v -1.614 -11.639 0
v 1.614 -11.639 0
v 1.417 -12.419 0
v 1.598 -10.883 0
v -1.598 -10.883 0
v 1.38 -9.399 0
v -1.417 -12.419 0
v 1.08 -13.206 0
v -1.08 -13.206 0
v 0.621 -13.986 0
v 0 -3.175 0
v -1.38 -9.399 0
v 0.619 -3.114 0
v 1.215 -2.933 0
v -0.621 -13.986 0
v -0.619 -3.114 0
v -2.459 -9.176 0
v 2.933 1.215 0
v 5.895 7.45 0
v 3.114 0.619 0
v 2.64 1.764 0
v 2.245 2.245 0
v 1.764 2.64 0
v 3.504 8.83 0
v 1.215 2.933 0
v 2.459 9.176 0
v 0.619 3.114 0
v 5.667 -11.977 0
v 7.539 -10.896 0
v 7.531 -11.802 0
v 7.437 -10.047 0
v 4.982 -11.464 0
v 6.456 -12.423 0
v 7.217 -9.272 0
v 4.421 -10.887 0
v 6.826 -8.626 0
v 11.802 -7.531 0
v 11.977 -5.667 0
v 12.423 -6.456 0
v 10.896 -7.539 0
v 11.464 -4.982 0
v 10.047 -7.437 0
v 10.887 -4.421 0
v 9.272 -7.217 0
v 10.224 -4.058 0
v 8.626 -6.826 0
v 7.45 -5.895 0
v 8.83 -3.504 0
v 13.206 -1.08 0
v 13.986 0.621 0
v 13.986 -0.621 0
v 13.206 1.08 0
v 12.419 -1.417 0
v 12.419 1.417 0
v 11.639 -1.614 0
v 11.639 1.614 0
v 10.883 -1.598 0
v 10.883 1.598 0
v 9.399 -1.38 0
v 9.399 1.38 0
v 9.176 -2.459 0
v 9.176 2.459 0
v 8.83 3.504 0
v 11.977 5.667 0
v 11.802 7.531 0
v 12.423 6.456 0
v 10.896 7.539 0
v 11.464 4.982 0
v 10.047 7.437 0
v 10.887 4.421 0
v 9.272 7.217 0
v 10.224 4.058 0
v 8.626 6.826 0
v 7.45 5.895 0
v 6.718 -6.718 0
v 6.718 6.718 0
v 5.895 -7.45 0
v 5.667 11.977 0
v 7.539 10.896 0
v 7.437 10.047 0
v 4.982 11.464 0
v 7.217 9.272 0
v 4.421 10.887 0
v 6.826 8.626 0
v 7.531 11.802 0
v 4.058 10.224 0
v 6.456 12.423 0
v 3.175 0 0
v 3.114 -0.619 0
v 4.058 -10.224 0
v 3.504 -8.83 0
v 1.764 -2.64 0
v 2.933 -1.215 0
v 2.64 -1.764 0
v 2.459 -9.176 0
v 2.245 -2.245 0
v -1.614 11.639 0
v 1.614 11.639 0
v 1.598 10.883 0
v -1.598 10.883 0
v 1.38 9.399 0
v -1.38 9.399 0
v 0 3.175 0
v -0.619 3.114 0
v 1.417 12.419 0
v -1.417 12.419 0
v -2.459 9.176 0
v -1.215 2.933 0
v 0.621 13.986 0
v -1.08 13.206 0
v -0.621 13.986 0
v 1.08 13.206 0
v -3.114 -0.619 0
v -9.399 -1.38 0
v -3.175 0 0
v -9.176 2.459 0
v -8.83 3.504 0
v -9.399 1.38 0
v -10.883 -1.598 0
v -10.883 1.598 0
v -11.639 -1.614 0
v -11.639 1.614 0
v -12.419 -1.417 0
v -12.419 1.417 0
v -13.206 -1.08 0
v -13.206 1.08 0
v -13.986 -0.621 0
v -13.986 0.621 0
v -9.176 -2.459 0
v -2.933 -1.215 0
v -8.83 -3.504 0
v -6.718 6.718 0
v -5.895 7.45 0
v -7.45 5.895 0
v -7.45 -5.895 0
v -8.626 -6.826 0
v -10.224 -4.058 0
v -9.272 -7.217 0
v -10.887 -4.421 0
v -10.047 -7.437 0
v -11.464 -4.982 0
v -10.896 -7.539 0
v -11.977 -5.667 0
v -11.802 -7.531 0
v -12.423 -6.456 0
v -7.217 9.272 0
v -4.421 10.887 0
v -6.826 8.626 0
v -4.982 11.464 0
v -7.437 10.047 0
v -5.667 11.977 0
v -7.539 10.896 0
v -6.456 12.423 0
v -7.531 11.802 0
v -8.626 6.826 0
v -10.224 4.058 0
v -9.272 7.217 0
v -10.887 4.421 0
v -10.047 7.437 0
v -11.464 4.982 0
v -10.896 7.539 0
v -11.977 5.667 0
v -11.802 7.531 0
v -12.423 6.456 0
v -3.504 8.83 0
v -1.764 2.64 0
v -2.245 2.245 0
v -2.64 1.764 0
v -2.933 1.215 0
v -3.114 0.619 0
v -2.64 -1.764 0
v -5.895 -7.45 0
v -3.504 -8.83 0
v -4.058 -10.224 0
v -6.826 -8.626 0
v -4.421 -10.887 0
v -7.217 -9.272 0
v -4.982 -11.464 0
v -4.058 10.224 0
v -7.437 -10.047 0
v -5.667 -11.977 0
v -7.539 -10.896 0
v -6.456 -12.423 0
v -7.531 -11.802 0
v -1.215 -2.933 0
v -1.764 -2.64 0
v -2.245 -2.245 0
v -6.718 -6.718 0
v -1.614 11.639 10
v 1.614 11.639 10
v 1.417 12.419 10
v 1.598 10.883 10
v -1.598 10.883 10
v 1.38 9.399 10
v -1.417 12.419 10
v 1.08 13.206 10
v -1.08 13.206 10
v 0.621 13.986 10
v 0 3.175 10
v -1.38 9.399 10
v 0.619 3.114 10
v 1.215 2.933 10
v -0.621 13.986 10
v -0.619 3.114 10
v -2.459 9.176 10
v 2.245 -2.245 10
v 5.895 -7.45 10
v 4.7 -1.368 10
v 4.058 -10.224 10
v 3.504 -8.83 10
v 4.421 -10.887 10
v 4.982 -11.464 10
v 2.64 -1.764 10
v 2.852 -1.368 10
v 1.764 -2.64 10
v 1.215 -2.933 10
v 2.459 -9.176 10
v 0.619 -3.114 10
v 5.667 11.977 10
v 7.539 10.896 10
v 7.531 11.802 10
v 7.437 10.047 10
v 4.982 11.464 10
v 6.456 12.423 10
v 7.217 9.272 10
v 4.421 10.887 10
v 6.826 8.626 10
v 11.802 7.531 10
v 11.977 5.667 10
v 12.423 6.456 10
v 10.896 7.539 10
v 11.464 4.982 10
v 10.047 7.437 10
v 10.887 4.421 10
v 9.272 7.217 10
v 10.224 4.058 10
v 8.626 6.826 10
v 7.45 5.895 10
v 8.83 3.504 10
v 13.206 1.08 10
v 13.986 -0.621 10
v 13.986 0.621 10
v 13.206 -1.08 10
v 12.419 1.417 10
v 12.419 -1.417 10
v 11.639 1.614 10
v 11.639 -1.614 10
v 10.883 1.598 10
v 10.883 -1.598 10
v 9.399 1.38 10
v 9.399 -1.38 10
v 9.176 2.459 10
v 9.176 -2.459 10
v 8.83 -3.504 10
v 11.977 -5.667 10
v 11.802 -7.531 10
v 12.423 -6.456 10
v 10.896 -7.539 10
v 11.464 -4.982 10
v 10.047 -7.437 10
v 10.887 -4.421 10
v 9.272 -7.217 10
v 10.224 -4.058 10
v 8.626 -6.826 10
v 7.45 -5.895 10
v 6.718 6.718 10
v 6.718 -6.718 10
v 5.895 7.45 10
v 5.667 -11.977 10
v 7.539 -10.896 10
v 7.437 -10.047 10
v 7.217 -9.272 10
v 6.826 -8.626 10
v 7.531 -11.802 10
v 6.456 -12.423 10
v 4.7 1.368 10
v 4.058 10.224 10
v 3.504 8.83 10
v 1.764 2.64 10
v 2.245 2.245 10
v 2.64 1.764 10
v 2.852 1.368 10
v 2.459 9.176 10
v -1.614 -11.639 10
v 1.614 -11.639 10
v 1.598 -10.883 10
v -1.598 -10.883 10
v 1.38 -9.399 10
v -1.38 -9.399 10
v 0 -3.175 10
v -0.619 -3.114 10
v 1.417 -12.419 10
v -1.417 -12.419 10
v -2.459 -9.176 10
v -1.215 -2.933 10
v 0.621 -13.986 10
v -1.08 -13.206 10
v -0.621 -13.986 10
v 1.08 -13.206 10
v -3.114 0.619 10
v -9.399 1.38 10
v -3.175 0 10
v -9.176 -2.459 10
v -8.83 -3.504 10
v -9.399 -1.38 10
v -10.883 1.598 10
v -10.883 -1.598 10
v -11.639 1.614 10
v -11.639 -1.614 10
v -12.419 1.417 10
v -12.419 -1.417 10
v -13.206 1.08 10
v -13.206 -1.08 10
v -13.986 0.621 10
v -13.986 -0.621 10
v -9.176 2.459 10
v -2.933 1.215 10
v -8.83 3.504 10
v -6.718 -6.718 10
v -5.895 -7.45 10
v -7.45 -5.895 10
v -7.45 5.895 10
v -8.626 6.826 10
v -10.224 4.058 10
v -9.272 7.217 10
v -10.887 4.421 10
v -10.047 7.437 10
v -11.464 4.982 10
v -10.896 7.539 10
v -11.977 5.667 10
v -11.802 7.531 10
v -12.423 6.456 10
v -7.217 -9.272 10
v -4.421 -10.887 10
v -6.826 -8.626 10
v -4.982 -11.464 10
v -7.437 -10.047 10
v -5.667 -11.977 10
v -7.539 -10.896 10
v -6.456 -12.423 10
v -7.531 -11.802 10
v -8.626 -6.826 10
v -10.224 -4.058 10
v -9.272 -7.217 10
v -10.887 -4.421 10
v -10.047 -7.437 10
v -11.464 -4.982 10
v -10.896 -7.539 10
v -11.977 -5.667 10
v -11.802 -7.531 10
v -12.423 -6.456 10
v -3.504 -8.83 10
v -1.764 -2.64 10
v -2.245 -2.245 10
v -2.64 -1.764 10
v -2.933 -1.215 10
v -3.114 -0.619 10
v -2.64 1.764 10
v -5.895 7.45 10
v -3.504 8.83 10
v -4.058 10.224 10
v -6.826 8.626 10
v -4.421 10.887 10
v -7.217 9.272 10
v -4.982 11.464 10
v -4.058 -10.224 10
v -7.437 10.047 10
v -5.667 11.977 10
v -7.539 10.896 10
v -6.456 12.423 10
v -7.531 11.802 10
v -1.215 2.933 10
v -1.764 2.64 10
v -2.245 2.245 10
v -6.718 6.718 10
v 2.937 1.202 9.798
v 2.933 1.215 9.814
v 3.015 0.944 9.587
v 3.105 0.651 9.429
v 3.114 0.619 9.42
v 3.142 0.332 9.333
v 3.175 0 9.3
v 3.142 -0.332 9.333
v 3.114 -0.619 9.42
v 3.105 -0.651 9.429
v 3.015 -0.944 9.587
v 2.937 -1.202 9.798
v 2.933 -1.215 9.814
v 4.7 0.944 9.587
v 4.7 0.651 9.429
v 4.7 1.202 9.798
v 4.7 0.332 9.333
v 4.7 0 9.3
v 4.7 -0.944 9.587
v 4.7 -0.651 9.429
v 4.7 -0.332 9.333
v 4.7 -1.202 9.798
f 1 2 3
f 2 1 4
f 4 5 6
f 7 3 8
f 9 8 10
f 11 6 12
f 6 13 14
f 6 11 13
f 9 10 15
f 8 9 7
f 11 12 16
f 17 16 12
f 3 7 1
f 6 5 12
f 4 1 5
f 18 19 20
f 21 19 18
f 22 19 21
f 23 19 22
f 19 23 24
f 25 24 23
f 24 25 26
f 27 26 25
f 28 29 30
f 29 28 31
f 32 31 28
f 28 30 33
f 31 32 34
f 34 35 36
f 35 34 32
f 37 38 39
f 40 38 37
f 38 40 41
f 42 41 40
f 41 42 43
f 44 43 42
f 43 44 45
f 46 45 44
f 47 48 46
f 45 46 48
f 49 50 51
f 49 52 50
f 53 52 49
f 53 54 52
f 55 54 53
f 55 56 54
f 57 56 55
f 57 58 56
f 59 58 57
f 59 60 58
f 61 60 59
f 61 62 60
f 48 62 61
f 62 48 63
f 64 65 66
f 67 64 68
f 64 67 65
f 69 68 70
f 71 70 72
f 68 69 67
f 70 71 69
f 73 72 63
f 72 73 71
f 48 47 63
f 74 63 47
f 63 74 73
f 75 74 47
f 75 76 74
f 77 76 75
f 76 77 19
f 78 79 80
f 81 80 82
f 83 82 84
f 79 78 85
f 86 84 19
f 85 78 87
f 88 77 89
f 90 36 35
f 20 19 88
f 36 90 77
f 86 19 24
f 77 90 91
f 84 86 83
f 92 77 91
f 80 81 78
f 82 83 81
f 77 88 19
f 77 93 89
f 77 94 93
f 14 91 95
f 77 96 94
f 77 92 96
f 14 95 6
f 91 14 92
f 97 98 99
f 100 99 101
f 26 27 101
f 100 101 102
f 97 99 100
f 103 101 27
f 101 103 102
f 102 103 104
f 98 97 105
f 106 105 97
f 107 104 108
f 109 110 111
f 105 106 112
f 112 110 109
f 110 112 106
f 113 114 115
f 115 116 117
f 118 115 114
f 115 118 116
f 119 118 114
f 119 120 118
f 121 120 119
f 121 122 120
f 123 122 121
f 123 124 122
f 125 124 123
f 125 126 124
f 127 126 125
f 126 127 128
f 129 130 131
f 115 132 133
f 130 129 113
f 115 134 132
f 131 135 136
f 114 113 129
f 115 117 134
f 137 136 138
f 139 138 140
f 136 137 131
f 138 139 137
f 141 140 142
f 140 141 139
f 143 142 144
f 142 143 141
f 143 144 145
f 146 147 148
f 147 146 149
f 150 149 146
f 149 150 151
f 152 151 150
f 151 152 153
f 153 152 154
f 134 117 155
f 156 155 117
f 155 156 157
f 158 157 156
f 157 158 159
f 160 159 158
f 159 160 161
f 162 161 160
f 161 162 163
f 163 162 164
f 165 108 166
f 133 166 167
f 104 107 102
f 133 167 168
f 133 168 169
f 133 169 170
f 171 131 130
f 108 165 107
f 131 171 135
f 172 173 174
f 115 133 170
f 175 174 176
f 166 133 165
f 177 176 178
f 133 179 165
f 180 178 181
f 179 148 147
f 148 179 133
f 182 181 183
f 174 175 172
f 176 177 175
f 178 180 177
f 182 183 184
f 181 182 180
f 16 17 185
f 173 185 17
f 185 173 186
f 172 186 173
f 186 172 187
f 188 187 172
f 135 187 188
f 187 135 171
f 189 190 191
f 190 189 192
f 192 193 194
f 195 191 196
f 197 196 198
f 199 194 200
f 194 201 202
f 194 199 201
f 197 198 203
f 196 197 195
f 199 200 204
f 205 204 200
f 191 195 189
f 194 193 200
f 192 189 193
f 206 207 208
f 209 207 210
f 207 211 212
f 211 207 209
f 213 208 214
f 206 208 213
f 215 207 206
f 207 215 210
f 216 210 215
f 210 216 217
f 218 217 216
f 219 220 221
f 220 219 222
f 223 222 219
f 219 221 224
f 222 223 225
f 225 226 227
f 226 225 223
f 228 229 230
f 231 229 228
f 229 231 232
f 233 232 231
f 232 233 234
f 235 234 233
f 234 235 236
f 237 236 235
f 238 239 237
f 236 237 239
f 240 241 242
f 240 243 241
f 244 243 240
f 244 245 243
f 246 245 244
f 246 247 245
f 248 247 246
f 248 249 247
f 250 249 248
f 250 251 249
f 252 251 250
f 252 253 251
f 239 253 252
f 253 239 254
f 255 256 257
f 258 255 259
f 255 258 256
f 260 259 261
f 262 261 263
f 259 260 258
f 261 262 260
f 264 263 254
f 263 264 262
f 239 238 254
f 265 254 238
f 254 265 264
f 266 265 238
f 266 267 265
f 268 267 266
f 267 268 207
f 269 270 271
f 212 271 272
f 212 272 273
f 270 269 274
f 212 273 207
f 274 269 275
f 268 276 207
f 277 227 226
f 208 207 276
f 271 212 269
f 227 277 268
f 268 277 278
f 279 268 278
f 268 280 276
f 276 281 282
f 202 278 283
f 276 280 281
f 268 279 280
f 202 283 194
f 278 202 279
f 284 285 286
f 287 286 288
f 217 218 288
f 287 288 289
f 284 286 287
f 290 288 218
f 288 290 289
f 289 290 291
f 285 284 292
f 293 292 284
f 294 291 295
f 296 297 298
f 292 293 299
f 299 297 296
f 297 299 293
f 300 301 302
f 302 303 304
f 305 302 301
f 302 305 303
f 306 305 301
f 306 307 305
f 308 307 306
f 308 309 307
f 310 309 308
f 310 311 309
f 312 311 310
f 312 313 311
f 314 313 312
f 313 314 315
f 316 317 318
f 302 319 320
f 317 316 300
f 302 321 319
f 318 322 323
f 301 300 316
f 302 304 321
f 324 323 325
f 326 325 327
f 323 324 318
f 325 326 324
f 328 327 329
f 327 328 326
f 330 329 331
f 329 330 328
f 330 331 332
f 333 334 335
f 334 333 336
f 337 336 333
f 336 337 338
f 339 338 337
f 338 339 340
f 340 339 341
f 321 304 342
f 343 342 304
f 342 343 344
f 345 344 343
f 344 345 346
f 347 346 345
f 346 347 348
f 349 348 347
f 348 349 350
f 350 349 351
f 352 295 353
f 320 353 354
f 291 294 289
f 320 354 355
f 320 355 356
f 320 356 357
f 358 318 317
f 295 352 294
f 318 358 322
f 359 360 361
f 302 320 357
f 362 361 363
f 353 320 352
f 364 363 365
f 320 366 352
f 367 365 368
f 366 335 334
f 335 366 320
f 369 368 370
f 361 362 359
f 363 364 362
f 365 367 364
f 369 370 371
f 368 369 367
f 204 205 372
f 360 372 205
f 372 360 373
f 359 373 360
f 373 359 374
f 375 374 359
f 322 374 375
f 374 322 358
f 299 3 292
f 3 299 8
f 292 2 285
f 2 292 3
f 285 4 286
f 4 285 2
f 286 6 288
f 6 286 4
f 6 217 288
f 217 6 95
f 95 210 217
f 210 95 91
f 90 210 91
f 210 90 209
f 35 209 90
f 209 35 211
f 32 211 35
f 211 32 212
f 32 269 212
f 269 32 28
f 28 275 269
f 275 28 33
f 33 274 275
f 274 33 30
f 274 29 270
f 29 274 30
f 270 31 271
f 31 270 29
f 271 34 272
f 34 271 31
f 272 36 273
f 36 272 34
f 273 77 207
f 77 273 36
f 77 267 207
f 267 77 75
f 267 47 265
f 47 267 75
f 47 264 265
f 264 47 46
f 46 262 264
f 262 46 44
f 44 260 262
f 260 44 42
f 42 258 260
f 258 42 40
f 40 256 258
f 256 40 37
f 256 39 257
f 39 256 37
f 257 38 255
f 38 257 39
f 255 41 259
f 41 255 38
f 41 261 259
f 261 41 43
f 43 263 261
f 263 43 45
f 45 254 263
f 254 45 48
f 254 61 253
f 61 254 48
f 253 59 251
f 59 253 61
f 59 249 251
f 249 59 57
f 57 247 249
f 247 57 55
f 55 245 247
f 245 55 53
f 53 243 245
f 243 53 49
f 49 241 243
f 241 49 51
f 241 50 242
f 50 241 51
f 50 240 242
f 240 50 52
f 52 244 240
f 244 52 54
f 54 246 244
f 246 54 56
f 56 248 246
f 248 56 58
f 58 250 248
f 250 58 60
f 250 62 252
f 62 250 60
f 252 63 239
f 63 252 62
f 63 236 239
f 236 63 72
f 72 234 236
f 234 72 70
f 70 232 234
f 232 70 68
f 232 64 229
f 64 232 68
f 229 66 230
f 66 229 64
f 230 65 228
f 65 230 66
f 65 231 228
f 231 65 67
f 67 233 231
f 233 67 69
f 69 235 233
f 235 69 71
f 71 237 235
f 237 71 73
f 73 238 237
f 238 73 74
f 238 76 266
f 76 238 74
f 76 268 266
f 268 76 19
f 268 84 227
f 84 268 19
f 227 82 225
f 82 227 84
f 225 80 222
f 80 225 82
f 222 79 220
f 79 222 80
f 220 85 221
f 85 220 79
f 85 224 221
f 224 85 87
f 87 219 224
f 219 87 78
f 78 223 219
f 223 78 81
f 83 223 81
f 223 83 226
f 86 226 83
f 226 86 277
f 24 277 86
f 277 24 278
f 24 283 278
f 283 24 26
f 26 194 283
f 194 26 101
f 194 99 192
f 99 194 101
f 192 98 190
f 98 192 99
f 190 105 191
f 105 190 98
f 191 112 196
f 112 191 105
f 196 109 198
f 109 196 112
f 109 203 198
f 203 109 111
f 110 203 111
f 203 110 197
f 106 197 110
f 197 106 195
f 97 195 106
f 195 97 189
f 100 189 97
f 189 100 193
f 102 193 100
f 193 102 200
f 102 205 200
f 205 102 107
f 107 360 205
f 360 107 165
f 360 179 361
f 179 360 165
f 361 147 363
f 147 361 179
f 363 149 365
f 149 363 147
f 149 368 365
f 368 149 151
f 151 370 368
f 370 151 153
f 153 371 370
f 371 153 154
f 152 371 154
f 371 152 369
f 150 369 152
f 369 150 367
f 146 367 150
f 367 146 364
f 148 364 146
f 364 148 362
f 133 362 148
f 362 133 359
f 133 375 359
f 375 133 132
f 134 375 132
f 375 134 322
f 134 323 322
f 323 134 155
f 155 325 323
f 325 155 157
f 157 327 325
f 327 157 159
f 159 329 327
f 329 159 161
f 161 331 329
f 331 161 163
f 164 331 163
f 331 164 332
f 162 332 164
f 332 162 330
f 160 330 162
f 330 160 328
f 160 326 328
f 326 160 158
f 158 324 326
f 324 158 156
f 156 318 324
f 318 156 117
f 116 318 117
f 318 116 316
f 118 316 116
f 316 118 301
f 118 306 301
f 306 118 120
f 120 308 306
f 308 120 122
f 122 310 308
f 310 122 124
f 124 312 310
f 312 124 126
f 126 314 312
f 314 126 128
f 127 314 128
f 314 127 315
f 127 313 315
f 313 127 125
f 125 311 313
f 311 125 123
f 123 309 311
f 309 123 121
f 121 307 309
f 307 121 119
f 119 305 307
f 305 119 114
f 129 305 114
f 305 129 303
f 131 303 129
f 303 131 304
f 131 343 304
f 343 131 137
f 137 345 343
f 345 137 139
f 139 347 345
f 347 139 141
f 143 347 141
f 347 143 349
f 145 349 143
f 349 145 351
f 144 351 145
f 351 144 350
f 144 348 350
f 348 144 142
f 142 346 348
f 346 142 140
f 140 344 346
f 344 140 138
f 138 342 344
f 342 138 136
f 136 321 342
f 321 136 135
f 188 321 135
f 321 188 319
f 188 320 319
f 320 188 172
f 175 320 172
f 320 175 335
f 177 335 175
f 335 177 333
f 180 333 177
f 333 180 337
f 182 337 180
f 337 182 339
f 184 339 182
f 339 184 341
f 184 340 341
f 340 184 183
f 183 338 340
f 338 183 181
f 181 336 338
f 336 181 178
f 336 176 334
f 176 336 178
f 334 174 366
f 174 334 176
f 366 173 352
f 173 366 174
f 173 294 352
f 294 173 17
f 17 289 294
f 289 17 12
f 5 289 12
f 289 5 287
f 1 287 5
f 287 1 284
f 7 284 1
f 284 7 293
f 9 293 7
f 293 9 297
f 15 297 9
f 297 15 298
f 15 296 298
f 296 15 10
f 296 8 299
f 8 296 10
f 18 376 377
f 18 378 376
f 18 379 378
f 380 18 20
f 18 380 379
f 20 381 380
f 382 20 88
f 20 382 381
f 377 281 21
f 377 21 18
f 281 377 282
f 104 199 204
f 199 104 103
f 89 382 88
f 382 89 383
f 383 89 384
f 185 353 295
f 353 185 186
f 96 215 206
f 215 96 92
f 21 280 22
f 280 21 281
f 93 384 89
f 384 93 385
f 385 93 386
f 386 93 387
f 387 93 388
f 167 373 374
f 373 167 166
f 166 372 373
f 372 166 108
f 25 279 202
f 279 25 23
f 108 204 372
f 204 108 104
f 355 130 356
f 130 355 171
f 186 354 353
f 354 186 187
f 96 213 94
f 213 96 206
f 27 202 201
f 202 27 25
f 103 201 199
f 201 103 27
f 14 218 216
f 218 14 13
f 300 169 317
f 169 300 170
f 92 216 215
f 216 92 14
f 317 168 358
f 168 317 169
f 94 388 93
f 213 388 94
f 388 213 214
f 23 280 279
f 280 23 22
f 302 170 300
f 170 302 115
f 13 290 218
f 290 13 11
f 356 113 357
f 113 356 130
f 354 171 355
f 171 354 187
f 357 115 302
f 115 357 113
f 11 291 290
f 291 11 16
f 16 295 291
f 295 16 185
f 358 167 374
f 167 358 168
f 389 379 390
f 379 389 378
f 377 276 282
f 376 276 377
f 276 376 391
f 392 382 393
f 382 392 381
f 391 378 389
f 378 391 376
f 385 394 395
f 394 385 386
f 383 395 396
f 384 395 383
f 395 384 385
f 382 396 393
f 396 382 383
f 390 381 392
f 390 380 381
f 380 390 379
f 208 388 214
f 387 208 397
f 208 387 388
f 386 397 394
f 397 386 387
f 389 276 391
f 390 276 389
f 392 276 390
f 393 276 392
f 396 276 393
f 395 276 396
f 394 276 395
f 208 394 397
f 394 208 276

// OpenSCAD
$fn = 32;

// ----------------------------------------------------------------------
// Spur gear: m=2 z=12, 28 mm tip diameter x 10 mm
// ----------------------------------------------------------------------

// --- parameters (mm) ---
modul = 2;                // module
n_teeth = 12;             // number of teeth
width = 10;               // face width
pa = 20;                  // pressure angle, deg
shaft_d = 6.35;           // shaft bore
set_d = 3.4;              // set screw tap hole
set_z = 11;               // set screw height

/* --- involute profile --- */
pitch_r = modul * n_teeth / 2;
base_r = pitch_r * cos(pa);
tip_r = pitch_r + modul;
root_r = pitch_r - 1.25 * modul;
flank_steps = 6;

function inv_deg(a) = (tan(a) - a * PI / 180) * 180 / PI;
function flank_r(i) = root_r + (tip_r - root_r) * i / flank_steps;
function half_angle(r) = 90 / n_teeth + inv_deg(pa) - inv_deg(acos(min(1, base_r / r)));
function tooth_pt(k, i, side) =
    let (r = flank_r(i), a = k * 360 / n_teeth + side * half_angle(r))
    [r * cos(a), r * sin(a)];

module tooth_profile() {
  polygon(points = [
    for (k = [0 : n_teeth - 1])
      each [
        for (i = [0 : flank_steps]) tooth_pt(k, i, -1),
        for (i = [flank_steps : -1 : 0]) tooth_pt(k, i, 1),
        let (ta = (k + 0.5) * 360 / n_teeth)
          [root_r * cos(ta), root_r * sin(ta)]
      ]
  ]);
}

module gear_disc() {
  linear_extrude(height = width) tooth_profile();
}

difference() {
  gear_disc();
  translate([0, 0, -1]) cylinder(h = width + 3, d = shaft_d);
  /* set screw, drilled radially */
  translate([-1, 0, set_z]) rotate([0, 90, 0]) cylinder(h = (root_r * 0.6), d = set_d);
}
